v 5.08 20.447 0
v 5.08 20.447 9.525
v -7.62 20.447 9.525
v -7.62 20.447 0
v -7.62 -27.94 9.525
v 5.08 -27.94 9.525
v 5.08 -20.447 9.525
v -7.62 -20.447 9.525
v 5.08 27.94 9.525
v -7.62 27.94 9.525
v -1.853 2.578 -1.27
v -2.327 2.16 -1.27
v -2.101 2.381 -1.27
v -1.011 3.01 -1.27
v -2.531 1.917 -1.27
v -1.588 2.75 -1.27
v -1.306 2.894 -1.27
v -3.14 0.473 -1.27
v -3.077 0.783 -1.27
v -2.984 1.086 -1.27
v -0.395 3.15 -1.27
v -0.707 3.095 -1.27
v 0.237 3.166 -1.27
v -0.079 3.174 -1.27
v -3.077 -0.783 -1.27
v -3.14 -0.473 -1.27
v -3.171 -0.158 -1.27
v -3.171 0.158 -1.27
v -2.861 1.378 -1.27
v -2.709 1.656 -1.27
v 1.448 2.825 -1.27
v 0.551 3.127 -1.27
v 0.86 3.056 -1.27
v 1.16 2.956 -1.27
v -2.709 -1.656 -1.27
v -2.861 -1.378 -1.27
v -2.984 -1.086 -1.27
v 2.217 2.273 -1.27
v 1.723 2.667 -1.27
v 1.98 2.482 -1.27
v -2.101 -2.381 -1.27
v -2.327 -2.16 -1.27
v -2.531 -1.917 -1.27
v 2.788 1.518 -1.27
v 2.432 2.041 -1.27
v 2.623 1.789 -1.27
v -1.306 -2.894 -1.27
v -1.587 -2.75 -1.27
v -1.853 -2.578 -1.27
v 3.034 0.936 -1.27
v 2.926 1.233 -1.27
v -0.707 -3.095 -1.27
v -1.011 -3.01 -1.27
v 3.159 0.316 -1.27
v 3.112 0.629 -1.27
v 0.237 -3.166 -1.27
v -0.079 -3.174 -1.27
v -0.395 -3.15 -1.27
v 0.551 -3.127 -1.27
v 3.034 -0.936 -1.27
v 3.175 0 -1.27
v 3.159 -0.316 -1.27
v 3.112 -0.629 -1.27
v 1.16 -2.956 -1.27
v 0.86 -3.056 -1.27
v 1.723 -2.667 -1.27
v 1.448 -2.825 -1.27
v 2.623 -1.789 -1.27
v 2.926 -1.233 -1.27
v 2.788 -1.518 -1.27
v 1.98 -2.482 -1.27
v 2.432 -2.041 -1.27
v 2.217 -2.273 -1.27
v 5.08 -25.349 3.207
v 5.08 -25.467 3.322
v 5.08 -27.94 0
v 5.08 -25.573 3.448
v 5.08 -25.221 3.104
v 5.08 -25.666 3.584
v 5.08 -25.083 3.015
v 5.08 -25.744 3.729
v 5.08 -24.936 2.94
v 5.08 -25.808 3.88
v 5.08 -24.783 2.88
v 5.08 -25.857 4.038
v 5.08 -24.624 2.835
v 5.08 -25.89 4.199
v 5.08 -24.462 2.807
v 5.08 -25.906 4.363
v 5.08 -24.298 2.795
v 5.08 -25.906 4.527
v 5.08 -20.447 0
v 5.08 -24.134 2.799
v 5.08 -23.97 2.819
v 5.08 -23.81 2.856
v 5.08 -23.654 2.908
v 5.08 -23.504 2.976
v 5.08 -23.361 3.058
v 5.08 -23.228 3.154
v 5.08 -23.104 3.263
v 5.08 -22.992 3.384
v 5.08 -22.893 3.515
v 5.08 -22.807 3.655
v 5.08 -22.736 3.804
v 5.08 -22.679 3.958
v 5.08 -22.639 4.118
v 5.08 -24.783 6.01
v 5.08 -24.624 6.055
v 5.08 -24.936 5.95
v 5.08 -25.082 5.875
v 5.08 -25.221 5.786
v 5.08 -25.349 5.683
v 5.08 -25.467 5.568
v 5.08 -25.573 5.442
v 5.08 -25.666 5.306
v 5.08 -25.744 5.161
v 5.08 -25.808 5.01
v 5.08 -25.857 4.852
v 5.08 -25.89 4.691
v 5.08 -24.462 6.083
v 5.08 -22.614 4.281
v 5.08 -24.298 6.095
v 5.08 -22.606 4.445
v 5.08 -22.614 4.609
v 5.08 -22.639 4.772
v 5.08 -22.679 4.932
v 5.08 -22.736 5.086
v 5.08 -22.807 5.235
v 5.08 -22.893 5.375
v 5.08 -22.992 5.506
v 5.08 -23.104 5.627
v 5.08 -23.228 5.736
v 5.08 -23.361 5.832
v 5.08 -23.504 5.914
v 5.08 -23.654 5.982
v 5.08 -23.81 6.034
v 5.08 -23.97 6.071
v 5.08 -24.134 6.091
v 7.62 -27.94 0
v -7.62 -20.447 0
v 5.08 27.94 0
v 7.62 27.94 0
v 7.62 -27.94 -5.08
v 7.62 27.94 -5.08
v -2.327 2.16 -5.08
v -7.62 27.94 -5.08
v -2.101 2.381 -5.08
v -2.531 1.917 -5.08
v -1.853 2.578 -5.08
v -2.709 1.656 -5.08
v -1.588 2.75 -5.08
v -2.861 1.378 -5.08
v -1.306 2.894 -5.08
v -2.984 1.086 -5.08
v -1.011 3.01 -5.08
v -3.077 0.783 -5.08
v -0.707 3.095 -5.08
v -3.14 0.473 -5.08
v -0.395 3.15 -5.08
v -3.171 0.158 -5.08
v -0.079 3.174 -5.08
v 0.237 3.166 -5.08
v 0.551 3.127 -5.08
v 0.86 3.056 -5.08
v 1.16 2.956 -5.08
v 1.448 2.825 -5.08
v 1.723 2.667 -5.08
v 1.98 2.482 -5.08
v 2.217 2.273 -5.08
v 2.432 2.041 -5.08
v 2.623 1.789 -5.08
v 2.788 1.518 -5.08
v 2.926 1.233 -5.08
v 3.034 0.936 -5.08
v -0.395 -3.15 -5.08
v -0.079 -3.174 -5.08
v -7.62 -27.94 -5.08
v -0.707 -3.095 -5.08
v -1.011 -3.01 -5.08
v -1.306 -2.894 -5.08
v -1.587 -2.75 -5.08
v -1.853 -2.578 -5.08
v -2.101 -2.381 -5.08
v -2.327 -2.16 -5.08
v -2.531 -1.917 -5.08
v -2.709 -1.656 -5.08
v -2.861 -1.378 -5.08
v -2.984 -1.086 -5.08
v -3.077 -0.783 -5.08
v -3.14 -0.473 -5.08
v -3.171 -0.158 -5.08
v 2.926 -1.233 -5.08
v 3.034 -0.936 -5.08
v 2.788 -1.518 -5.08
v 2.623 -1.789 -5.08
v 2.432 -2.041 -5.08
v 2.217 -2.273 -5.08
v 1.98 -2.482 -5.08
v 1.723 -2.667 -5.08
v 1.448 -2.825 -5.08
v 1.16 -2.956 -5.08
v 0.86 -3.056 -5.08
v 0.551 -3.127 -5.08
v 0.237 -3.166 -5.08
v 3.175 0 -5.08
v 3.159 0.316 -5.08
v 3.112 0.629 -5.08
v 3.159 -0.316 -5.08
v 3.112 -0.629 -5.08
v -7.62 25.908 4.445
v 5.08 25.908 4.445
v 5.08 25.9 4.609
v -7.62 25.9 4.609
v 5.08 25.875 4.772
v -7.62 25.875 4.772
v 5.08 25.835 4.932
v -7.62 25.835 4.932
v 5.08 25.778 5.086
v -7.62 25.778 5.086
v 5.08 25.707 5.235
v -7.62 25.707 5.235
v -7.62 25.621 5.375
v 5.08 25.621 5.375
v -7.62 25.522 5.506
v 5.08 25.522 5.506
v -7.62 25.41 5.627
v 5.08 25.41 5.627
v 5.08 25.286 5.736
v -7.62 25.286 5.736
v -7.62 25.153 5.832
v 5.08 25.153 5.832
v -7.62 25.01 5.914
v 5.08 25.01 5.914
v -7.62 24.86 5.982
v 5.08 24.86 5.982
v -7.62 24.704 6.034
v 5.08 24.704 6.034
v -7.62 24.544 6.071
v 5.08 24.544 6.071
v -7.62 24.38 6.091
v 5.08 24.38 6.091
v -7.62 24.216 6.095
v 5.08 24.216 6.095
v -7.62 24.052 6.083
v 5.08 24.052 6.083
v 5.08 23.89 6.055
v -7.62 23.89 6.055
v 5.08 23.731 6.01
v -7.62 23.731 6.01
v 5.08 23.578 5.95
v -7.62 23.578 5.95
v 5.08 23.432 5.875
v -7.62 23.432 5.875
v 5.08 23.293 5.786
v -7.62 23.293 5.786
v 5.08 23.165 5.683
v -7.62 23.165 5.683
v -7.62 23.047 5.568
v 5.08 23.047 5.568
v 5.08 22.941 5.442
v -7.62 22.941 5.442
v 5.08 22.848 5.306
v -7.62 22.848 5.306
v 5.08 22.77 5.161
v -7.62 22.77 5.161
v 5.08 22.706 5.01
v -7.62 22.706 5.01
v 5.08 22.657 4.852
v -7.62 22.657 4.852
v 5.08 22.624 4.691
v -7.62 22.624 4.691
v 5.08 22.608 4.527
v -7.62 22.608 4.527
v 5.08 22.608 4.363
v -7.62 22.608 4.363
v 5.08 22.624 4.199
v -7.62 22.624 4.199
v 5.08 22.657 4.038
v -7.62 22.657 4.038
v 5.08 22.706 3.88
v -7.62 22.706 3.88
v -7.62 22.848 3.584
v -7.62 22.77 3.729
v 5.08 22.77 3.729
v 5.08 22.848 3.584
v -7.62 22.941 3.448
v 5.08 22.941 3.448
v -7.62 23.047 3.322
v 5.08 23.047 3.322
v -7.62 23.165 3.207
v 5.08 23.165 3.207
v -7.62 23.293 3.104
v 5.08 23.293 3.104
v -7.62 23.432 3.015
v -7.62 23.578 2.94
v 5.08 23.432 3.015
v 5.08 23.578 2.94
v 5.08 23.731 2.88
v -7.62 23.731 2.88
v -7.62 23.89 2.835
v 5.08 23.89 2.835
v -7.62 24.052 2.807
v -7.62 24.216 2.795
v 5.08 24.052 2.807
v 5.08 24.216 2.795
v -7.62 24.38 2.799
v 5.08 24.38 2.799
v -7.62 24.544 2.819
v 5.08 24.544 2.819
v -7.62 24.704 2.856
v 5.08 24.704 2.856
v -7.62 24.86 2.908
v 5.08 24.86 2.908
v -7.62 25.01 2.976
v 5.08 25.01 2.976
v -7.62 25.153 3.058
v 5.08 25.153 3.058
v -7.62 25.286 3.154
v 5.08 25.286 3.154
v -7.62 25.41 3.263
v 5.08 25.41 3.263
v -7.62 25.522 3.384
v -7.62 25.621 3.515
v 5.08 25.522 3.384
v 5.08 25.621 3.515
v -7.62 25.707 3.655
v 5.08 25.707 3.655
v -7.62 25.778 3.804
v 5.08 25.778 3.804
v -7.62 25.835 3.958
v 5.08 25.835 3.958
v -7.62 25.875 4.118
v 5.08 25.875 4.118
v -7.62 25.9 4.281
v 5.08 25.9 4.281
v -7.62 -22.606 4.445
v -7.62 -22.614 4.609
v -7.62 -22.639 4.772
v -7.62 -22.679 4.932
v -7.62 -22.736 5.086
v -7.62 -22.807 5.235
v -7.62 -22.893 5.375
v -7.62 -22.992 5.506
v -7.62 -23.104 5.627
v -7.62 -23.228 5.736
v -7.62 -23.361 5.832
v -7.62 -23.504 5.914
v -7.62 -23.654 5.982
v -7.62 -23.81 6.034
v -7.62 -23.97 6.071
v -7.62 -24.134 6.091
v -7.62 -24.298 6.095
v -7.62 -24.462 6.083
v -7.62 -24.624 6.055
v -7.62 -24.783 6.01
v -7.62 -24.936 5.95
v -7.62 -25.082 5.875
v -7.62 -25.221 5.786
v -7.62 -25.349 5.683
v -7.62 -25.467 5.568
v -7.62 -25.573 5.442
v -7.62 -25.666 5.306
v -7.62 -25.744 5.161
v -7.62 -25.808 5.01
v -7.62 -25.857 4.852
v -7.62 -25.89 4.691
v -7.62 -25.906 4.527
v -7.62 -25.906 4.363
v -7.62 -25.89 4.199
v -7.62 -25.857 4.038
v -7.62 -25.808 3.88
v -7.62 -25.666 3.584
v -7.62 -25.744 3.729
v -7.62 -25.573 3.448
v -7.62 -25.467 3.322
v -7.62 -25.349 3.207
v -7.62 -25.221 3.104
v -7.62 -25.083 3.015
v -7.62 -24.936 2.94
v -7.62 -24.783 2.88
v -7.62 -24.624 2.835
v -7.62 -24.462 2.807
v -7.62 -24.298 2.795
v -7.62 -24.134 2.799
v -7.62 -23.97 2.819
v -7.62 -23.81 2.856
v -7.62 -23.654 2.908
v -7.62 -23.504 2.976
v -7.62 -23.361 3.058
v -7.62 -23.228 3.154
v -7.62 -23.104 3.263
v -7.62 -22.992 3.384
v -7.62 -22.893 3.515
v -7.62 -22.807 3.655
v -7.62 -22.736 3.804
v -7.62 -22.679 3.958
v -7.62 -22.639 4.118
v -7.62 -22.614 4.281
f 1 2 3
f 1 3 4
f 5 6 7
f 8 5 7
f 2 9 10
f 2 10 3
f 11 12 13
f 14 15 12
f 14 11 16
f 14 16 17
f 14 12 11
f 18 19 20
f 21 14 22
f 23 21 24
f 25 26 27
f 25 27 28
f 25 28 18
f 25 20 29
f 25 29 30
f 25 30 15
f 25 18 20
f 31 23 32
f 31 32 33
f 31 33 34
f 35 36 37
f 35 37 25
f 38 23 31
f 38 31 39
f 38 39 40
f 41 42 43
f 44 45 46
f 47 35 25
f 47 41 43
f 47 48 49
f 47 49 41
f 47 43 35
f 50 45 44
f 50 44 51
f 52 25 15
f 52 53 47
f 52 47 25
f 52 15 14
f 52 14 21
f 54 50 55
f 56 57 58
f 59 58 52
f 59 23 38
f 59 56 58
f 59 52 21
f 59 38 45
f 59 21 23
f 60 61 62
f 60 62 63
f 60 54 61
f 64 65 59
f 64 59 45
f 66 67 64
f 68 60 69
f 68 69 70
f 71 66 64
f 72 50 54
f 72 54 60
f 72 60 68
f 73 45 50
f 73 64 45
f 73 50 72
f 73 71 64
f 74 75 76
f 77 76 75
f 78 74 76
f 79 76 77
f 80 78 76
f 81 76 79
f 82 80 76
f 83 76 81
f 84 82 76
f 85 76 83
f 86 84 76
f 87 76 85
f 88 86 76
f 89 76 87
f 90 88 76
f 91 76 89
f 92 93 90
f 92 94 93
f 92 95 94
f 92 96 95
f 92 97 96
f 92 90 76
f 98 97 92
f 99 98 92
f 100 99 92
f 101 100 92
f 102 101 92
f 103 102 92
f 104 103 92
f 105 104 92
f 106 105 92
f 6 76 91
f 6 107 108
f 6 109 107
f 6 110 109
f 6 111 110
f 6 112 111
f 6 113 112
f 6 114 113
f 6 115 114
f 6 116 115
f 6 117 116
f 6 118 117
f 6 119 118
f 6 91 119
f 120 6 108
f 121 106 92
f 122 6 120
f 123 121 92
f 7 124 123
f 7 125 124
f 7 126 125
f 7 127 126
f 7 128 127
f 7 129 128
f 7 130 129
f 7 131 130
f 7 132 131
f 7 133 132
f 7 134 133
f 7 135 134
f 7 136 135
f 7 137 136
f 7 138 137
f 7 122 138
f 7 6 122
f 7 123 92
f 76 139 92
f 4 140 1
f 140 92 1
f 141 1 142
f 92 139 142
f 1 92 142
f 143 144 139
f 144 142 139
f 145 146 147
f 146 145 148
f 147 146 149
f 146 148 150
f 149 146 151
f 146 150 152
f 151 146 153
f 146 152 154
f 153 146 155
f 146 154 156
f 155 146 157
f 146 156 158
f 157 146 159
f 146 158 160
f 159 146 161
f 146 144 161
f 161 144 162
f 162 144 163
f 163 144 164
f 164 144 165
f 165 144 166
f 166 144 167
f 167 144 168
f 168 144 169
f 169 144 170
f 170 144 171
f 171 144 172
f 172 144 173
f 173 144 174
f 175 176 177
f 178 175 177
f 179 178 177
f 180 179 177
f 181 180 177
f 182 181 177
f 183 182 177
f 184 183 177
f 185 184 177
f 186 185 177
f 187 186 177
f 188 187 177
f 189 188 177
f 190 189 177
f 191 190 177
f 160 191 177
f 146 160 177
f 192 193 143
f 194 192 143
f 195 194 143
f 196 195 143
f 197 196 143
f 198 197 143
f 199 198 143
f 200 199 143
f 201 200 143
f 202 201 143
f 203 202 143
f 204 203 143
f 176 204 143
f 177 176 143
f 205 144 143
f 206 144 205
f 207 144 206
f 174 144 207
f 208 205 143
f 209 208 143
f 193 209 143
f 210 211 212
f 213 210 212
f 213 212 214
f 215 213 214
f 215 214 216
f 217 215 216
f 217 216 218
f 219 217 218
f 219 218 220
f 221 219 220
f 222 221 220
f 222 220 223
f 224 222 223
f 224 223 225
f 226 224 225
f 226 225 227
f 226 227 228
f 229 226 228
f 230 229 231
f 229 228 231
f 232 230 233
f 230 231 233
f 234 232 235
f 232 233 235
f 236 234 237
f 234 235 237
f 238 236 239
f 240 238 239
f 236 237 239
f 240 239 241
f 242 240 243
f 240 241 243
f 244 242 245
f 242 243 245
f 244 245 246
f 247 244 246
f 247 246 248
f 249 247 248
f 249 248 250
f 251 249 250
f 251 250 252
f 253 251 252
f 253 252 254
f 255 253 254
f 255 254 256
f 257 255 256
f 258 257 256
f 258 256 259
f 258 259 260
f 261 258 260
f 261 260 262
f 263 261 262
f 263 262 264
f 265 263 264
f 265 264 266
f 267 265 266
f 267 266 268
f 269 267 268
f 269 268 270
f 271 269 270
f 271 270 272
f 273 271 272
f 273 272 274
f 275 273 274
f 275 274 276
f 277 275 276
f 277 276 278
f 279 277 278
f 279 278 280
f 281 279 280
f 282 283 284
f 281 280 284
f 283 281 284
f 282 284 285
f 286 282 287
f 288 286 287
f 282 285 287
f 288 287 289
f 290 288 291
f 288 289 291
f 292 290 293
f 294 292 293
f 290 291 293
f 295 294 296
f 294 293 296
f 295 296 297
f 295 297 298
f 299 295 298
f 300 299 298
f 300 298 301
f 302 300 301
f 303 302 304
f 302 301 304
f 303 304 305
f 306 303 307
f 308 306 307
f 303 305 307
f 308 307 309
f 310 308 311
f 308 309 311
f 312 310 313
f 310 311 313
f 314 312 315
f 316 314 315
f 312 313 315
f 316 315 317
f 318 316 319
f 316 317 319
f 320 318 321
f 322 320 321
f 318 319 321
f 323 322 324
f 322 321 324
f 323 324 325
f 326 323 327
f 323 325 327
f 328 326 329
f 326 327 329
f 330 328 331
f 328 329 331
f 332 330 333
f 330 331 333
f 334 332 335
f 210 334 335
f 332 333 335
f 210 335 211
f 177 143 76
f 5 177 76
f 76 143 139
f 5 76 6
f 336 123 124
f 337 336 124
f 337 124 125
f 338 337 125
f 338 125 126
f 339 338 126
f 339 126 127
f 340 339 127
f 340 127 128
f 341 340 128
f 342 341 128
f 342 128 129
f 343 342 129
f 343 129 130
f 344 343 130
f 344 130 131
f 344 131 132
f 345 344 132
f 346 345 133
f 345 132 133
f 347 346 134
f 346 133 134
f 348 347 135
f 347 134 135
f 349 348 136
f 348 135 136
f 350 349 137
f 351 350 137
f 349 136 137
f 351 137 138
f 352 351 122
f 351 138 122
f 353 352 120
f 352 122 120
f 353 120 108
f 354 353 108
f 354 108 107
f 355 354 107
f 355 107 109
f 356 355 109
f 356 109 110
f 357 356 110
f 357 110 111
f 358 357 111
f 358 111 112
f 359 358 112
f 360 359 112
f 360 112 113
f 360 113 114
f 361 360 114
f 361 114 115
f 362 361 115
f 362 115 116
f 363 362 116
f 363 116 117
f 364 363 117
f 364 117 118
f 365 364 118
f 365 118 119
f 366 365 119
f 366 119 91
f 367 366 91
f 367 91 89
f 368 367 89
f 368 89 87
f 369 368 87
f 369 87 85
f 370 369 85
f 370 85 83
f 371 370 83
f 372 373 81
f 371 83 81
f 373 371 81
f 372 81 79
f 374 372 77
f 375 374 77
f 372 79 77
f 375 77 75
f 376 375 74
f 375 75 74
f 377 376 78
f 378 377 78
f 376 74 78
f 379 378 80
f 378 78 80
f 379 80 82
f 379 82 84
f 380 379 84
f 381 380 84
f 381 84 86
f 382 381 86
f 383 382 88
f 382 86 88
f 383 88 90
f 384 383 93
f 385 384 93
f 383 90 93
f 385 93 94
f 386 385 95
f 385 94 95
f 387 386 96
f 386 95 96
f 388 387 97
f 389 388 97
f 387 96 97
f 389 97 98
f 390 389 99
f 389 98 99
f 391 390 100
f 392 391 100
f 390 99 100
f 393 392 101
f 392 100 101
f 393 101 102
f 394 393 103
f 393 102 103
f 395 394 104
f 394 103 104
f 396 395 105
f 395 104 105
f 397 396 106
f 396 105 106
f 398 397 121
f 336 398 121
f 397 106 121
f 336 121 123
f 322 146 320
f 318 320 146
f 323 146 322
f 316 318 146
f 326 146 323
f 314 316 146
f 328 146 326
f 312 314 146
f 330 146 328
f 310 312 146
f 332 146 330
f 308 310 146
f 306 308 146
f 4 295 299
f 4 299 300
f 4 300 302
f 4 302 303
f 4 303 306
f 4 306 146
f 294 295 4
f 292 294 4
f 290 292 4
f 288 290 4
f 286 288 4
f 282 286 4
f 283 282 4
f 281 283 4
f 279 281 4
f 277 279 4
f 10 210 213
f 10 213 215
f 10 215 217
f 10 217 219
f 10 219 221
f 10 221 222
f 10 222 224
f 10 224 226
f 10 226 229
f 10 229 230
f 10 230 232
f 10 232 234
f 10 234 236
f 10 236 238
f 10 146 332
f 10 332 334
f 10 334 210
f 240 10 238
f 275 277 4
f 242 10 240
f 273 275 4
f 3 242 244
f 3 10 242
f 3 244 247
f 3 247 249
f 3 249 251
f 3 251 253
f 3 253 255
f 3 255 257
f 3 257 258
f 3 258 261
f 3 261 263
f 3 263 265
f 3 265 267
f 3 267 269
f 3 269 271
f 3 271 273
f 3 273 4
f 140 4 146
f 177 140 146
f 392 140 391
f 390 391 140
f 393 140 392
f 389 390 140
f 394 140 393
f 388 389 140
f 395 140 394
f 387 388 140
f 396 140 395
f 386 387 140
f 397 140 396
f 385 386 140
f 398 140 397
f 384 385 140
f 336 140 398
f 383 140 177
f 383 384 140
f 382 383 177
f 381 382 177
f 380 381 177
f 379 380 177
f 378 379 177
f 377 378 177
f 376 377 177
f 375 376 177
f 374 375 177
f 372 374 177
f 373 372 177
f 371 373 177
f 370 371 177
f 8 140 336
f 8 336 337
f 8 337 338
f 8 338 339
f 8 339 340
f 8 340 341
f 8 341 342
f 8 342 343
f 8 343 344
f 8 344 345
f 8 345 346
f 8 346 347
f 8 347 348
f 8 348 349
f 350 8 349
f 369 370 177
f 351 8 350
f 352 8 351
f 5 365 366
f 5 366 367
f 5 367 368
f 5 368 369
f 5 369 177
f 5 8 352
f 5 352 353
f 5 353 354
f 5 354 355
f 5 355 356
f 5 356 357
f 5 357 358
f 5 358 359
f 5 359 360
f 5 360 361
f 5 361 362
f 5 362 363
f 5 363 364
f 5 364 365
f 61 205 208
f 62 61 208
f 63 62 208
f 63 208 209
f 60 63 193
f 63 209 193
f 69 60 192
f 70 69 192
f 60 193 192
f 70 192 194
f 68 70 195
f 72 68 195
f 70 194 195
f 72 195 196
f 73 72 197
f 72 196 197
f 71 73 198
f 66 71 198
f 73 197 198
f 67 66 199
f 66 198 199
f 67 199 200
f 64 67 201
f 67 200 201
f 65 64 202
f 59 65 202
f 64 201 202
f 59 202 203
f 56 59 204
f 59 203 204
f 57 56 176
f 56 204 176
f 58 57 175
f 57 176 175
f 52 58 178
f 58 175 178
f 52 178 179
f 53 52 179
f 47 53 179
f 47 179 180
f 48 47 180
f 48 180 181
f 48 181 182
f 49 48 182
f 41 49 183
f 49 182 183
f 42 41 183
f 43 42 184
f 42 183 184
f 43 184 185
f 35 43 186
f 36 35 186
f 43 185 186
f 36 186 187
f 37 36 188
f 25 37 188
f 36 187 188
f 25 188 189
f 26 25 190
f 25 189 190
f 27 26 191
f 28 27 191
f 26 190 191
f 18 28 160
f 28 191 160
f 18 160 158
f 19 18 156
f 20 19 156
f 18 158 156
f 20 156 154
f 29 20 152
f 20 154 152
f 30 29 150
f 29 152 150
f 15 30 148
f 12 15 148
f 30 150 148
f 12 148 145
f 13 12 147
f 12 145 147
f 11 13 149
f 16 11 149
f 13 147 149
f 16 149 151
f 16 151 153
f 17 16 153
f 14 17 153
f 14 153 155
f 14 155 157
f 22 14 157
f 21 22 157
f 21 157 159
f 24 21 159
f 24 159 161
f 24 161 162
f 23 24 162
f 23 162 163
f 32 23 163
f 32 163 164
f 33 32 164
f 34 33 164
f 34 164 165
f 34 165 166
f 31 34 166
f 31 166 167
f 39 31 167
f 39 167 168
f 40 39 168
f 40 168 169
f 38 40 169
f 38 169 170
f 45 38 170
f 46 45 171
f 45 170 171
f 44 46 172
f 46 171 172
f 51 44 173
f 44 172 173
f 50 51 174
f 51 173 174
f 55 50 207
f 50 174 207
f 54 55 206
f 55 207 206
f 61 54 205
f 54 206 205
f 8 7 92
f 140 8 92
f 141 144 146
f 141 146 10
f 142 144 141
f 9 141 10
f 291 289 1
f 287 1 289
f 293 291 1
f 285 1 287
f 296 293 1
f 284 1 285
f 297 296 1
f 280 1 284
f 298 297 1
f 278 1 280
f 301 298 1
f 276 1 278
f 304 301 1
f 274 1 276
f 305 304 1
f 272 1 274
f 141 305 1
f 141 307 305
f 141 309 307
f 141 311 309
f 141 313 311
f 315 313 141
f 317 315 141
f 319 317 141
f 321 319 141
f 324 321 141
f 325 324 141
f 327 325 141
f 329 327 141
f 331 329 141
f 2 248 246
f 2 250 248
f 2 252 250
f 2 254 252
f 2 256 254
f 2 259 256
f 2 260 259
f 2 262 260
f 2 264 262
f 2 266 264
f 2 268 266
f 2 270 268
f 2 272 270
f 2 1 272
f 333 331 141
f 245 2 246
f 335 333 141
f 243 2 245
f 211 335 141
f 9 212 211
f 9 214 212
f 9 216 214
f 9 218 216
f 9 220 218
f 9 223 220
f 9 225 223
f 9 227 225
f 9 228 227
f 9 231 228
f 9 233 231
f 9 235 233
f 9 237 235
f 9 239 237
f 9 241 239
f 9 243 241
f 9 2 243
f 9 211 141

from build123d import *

# Parameters (mm, degrees)
F1_DEPTH = 7.62
F3_R     = 1.651
F4_DEPTH = 25.4
F5_R     = 3.175
F6_DEPTH = 3.81
F7_W     = 55.88
F7_H     = 9.525
F8_DEPTH = 2.54


with BuildPart() as f1:
    # F0 (on Right) → F1 (new body, symmetric)
    with BuildSketch(Plane.YZ):
        Polygon((0, 0), (0, -5.08), (27.94, -5.08), (27.94, 9.525), (20.447, 9.525), (20.447, 0), align=None)
    extrude(amount=F1_DEPTH, both=True)

    # F2: F1 across plane


with BuildPart() as f1_1:
    add(f1.part)
    add(f1.part.mirror(Plane.XZ))

    # F3 (on face) → F4 (cut)
    with BuildSketch(Plane.YZ.offset(7.62)):
        with Locations((-24.257, 4.445)):
            Circle(F3_R)
        with Locations((24.257, 4.445)):
            Circle(F3_R)
    extrude(amount=-F4_DEPTH, mode=Mode.SUBTRACT)

    # F5 (on face) → F6 (cut)
    with BuildSketch(Plane(origin=(0, 0, -5.08), x_dir=(1, 0, 0), z_dir=(0, 0, -1))):
        Circle(F5_R)
    extrude(amount=-F6_DEPTH, mode=Mode.SUBTRACT)

    # F7 (on face) → F8 (cut)
    with BuildSketch(Plane.YZ.offset(7.62)):
        with Locations((0, 4.7625)):
            Rectangle(F7_W, F7_H)
    extrude(amount=-F8_DEPTH, mode=Mode.SUBTRACT)


solid = f1_1.part
